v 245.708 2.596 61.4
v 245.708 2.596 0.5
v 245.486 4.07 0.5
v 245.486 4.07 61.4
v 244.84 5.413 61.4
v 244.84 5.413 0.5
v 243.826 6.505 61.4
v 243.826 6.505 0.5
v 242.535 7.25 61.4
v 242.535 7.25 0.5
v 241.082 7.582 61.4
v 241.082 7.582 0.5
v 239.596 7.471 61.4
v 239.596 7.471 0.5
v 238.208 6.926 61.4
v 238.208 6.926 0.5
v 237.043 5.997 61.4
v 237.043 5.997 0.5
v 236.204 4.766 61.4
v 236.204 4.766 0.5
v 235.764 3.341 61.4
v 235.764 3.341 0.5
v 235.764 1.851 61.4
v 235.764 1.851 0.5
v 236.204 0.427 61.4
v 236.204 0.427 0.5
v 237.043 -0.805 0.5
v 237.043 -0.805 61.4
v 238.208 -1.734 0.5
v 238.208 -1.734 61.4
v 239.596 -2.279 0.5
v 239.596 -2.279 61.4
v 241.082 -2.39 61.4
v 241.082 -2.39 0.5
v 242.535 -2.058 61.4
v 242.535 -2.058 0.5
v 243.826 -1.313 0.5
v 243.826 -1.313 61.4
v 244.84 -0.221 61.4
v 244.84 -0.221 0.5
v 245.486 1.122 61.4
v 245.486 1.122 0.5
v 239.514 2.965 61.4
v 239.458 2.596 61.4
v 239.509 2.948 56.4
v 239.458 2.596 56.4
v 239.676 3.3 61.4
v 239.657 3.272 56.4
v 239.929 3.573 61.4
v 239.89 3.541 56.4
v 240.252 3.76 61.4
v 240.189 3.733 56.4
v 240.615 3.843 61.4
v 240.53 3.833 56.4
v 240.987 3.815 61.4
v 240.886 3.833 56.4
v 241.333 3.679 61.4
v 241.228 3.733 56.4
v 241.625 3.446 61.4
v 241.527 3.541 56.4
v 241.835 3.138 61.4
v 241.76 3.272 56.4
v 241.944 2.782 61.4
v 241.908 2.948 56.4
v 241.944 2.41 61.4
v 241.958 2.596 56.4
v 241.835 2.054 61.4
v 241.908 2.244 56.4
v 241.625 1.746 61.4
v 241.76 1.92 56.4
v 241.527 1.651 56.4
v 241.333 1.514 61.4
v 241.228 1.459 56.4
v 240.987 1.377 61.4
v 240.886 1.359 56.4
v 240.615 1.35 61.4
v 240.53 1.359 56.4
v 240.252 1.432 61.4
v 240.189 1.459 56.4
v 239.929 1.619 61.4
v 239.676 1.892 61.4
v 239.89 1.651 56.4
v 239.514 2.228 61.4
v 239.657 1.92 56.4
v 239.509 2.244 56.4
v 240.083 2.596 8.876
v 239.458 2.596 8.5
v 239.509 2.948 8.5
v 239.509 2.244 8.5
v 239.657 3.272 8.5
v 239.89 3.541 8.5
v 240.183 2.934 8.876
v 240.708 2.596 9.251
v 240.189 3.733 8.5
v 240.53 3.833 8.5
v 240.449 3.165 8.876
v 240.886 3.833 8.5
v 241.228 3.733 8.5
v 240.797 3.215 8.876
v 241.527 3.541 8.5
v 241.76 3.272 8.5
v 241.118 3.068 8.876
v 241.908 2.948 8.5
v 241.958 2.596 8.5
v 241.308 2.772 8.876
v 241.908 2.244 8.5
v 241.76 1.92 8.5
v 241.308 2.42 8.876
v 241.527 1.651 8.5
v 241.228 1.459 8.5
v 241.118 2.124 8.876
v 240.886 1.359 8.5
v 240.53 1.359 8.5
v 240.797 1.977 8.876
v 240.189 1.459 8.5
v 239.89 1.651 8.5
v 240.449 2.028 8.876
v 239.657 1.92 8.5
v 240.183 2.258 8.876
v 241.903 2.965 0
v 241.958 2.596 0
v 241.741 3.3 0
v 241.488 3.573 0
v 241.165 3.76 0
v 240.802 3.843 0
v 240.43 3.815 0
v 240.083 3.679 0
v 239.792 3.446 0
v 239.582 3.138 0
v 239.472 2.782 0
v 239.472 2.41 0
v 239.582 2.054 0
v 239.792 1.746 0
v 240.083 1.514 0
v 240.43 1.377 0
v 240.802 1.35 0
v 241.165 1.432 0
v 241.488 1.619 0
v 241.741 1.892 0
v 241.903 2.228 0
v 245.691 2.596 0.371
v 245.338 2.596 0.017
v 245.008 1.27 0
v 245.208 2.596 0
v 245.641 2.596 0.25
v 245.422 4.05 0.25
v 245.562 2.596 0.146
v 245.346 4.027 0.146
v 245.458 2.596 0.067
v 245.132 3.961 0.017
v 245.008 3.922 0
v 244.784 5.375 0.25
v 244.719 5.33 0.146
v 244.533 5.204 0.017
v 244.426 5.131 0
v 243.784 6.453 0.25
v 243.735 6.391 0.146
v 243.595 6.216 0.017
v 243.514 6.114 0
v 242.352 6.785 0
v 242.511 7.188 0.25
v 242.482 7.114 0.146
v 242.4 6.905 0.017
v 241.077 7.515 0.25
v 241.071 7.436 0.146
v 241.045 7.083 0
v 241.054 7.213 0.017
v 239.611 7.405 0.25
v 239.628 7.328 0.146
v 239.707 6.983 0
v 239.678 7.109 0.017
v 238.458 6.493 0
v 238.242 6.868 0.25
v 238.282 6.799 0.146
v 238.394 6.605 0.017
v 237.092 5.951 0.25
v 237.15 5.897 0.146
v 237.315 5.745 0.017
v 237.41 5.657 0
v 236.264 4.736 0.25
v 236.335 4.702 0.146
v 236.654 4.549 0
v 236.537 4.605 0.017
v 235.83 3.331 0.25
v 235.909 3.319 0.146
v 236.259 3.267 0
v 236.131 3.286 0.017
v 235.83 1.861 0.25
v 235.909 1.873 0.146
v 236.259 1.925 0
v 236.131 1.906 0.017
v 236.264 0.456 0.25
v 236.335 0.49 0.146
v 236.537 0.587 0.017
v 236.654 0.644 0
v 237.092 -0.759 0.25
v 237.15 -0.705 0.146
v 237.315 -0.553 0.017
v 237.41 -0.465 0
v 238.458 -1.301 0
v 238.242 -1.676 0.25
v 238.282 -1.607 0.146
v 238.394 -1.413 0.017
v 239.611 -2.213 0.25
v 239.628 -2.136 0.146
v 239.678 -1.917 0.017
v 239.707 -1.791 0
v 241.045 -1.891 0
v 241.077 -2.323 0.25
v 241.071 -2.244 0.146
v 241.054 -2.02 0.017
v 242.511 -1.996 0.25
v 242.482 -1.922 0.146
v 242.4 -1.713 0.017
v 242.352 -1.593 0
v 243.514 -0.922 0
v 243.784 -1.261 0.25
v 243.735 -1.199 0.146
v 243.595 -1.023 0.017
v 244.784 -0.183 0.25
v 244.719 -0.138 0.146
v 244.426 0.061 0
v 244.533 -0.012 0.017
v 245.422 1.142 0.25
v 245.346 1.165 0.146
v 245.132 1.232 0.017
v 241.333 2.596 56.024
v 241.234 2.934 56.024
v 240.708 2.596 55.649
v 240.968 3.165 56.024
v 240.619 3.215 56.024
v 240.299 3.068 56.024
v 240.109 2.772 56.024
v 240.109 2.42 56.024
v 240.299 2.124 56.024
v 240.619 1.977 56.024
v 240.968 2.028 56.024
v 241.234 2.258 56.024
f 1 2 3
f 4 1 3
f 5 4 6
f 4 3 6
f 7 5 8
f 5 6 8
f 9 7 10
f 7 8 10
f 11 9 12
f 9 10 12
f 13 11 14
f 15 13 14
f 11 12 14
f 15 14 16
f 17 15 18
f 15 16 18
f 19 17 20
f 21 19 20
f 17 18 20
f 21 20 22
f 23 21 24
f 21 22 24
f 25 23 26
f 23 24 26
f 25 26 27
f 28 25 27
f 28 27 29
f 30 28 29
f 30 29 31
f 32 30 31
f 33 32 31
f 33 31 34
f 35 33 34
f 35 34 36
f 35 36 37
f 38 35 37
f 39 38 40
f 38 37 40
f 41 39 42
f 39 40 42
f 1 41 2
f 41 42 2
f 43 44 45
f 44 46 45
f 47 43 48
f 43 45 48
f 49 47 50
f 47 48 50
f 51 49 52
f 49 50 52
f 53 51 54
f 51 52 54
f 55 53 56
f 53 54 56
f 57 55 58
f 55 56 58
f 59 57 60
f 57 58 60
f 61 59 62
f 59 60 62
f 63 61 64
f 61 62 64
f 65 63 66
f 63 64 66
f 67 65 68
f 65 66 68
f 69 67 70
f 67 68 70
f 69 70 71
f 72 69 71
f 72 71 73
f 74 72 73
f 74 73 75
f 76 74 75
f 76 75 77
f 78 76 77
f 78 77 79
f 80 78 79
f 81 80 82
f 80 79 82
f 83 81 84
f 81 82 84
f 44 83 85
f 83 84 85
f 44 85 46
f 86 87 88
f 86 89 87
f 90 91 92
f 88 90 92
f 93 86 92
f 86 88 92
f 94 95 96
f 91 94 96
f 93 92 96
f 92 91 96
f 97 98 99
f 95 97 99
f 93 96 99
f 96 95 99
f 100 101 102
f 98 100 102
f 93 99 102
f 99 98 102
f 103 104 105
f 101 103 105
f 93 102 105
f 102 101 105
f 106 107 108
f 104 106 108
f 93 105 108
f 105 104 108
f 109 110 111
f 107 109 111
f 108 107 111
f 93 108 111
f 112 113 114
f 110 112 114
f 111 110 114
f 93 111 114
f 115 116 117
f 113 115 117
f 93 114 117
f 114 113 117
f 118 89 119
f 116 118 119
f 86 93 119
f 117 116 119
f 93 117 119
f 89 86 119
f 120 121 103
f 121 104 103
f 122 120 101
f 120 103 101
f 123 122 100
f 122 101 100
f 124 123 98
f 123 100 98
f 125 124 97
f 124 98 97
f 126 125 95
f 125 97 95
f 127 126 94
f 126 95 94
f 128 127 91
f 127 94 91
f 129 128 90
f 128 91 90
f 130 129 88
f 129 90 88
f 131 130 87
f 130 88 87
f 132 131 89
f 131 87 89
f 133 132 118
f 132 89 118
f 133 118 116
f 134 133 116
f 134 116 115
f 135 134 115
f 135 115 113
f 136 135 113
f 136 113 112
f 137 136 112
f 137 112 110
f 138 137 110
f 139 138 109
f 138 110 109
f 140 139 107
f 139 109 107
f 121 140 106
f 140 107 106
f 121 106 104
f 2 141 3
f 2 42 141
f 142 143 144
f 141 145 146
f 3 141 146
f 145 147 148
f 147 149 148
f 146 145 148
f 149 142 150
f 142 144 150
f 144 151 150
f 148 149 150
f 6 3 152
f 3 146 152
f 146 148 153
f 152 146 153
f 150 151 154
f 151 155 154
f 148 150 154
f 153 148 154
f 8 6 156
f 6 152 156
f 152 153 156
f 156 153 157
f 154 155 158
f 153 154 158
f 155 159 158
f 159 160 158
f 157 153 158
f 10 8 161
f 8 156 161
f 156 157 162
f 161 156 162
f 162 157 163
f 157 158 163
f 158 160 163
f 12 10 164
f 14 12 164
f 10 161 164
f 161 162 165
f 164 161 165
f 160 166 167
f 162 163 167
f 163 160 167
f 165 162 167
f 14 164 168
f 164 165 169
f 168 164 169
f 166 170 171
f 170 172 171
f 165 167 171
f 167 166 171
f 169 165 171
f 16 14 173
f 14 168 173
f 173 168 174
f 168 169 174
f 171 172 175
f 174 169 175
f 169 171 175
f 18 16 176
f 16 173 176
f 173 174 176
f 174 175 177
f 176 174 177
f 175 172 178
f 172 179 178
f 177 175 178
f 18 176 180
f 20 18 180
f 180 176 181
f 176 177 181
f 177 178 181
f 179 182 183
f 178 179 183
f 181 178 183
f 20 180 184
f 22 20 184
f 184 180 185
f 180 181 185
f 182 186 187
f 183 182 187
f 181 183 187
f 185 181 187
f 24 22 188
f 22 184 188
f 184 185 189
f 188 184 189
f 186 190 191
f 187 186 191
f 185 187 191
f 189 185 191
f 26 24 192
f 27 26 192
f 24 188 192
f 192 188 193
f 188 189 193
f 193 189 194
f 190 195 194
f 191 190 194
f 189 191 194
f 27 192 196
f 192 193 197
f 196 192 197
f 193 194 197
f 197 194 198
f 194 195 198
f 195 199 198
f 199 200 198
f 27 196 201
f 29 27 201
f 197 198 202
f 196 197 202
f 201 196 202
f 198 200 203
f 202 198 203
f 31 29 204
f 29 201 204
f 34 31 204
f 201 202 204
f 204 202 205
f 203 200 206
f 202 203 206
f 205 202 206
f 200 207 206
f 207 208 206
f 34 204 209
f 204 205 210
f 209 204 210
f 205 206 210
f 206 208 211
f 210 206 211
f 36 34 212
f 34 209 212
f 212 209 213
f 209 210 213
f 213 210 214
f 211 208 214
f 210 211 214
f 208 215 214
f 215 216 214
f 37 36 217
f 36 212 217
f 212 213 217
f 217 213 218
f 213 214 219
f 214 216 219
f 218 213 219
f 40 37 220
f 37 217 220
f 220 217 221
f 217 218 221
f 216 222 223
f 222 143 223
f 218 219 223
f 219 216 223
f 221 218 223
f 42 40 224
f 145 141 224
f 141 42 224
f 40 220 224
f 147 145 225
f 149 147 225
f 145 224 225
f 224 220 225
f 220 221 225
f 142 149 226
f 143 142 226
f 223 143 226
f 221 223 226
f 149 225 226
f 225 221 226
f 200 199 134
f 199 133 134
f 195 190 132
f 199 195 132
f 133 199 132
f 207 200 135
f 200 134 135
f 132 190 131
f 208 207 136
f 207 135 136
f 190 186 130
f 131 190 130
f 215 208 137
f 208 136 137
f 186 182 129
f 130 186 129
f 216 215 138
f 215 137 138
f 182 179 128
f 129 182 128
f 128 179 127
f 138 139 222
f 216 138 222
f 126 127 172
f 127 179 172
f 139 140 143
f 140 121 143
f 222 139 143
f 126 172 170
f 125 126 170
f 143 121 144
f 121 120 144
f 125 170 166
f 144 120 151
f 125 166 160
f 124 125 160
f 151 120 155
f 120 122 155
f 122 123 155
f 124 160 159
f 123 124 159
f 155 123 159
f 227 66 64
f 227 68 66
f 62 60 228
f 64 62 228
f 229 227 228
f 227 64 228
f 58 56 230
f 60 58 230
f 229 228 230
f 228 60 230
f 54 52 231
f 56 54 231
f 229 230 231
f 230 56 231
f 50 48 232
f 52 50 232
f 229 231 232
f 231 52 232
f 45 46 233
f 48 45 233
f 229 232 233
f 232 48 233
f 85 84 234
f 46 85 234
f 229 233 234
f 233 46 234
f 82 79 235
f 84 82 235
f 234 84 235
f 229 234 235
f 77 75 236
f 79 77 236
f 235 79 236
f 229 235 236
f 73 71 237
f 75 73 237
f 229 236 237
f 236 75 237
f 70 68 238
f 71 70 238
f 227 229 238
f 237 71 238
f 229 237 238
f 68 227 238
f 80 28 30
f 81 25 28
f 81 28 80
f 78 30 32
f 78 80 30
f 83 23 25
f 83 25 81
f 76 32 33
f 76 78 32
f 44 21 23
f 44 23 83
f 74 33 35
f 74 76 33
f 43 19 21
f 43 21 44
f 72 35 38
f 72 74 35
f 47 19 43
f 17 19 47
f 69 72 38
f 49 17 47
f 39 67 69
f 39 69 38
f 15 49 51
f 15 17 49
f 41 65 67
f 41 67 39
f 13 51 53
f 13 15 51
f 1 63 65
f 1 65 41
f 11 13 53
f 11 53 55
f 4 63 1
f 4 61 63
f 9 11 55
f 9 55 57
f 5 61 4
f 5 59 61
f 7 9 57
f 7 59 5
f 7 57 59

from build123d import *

# Parameters (mm, degrees)
ESBO_O1_R                                      = 5
RESSALTO_EXTRUS_O1_DEPTH                       = 61.4
FURO_ROSCADO_DE_M3X0_52_D                      = 2.5
FURO_ROSCADO_DE_M3X0_52_DEPTH                  = 8.5
FURO_ROSCADO_DE_M3X0_52_TIP                    = 0.751075774
FILETE1_R                                      = 0.5
BROCA_DE_ROSQUEAR_PARA_TARRAXA_DE_M3X0_5_D     = 2.5
BROCA_DE_ROSQUEAR_PARA_TARRAXA_DE_M3X0_5_DEPTH = 5
BROCA_DE_ROSQUEAR_PARA_TARRAXA_DE_M3X0_5_TIP   = 0.751075774


with BuildPart() as part:
    # Esboço1 → Ressalto-extrusão1 (new body)
    with BuildSketch(Plane.XY):
        with Locations((240.708388302, 2.596082859)):
            Circle(ESBO_O1_R)
    extrude(amount=RESSALTO_EXTRUS_O1_DEPTH)

    # Furo roscado de M3x0.52
    with Locations(Plane(origin=(0, 0, 0), x_dir=(-1, 0, 0), z_dir=(0, 0, -1))):
        with Locations((-240.708388302, 2.596082859)):
            Hole(FURO_ROSCADO_DE_M3X0_52_D / 2, depth=FURO_ROSCADO_DE_M3X0_52_DEPTH)
            with Locations((0, 0, -(FURO_ROSCADO_DE_M3X0_52_DEPTH + FURO_ROSCADO_DE_M3X0_52_TIP / 2))):  # 118° drill point
                Cone(0, FURO_ROSCADO_DE_M3X0_52_D / 2, FURO_ROSCADO_DE_M3X0_52_TIP, mode=Mode.SUBTRACT)

    # Filete1
    filete1_edges = [part.edges().sort_by_distance(p)[0] for p in [
        (235.708388302, 2.596082859, 0),
    ]]
    fillet(filete1_edges, radius=FILETE1_R)

    # Broca de rosquear para tarraxa de M3x0.51
    with Locations(Plane.XY.offset(61.4)):
        with Locations((240.708388302, 2.596082859)):
            Hole(BROCA_DE_ROSQUEAR_PARA_TARRAXA_DE_M3X0_5_D / 2, depth=BROCA_DE_ROSQUEAR_PARA_TARRAXA_DE_M3X0_5_DEPTH)
            with Locations((0, 0, -(BROCA_DE_ROSQUEAR_PARA_TARRAXA_DE_M3X0_5_DEPTH + BROCA_DE_ROSQUEAR_PARA_TARRAXA_DE_M3X0_5_TIP / 2))):  # 118° drill point
                Cone(0, BROCA_DE_ROSQUEAR_PARA_TARRAXA_DE_M3X0_5_D / 2, BROCA_DE_ROSQUEAR_PARA_TARRAXA_DE_M3X0_5_TIP, mode=Mode.SUBTRACT)


solid = part.part
